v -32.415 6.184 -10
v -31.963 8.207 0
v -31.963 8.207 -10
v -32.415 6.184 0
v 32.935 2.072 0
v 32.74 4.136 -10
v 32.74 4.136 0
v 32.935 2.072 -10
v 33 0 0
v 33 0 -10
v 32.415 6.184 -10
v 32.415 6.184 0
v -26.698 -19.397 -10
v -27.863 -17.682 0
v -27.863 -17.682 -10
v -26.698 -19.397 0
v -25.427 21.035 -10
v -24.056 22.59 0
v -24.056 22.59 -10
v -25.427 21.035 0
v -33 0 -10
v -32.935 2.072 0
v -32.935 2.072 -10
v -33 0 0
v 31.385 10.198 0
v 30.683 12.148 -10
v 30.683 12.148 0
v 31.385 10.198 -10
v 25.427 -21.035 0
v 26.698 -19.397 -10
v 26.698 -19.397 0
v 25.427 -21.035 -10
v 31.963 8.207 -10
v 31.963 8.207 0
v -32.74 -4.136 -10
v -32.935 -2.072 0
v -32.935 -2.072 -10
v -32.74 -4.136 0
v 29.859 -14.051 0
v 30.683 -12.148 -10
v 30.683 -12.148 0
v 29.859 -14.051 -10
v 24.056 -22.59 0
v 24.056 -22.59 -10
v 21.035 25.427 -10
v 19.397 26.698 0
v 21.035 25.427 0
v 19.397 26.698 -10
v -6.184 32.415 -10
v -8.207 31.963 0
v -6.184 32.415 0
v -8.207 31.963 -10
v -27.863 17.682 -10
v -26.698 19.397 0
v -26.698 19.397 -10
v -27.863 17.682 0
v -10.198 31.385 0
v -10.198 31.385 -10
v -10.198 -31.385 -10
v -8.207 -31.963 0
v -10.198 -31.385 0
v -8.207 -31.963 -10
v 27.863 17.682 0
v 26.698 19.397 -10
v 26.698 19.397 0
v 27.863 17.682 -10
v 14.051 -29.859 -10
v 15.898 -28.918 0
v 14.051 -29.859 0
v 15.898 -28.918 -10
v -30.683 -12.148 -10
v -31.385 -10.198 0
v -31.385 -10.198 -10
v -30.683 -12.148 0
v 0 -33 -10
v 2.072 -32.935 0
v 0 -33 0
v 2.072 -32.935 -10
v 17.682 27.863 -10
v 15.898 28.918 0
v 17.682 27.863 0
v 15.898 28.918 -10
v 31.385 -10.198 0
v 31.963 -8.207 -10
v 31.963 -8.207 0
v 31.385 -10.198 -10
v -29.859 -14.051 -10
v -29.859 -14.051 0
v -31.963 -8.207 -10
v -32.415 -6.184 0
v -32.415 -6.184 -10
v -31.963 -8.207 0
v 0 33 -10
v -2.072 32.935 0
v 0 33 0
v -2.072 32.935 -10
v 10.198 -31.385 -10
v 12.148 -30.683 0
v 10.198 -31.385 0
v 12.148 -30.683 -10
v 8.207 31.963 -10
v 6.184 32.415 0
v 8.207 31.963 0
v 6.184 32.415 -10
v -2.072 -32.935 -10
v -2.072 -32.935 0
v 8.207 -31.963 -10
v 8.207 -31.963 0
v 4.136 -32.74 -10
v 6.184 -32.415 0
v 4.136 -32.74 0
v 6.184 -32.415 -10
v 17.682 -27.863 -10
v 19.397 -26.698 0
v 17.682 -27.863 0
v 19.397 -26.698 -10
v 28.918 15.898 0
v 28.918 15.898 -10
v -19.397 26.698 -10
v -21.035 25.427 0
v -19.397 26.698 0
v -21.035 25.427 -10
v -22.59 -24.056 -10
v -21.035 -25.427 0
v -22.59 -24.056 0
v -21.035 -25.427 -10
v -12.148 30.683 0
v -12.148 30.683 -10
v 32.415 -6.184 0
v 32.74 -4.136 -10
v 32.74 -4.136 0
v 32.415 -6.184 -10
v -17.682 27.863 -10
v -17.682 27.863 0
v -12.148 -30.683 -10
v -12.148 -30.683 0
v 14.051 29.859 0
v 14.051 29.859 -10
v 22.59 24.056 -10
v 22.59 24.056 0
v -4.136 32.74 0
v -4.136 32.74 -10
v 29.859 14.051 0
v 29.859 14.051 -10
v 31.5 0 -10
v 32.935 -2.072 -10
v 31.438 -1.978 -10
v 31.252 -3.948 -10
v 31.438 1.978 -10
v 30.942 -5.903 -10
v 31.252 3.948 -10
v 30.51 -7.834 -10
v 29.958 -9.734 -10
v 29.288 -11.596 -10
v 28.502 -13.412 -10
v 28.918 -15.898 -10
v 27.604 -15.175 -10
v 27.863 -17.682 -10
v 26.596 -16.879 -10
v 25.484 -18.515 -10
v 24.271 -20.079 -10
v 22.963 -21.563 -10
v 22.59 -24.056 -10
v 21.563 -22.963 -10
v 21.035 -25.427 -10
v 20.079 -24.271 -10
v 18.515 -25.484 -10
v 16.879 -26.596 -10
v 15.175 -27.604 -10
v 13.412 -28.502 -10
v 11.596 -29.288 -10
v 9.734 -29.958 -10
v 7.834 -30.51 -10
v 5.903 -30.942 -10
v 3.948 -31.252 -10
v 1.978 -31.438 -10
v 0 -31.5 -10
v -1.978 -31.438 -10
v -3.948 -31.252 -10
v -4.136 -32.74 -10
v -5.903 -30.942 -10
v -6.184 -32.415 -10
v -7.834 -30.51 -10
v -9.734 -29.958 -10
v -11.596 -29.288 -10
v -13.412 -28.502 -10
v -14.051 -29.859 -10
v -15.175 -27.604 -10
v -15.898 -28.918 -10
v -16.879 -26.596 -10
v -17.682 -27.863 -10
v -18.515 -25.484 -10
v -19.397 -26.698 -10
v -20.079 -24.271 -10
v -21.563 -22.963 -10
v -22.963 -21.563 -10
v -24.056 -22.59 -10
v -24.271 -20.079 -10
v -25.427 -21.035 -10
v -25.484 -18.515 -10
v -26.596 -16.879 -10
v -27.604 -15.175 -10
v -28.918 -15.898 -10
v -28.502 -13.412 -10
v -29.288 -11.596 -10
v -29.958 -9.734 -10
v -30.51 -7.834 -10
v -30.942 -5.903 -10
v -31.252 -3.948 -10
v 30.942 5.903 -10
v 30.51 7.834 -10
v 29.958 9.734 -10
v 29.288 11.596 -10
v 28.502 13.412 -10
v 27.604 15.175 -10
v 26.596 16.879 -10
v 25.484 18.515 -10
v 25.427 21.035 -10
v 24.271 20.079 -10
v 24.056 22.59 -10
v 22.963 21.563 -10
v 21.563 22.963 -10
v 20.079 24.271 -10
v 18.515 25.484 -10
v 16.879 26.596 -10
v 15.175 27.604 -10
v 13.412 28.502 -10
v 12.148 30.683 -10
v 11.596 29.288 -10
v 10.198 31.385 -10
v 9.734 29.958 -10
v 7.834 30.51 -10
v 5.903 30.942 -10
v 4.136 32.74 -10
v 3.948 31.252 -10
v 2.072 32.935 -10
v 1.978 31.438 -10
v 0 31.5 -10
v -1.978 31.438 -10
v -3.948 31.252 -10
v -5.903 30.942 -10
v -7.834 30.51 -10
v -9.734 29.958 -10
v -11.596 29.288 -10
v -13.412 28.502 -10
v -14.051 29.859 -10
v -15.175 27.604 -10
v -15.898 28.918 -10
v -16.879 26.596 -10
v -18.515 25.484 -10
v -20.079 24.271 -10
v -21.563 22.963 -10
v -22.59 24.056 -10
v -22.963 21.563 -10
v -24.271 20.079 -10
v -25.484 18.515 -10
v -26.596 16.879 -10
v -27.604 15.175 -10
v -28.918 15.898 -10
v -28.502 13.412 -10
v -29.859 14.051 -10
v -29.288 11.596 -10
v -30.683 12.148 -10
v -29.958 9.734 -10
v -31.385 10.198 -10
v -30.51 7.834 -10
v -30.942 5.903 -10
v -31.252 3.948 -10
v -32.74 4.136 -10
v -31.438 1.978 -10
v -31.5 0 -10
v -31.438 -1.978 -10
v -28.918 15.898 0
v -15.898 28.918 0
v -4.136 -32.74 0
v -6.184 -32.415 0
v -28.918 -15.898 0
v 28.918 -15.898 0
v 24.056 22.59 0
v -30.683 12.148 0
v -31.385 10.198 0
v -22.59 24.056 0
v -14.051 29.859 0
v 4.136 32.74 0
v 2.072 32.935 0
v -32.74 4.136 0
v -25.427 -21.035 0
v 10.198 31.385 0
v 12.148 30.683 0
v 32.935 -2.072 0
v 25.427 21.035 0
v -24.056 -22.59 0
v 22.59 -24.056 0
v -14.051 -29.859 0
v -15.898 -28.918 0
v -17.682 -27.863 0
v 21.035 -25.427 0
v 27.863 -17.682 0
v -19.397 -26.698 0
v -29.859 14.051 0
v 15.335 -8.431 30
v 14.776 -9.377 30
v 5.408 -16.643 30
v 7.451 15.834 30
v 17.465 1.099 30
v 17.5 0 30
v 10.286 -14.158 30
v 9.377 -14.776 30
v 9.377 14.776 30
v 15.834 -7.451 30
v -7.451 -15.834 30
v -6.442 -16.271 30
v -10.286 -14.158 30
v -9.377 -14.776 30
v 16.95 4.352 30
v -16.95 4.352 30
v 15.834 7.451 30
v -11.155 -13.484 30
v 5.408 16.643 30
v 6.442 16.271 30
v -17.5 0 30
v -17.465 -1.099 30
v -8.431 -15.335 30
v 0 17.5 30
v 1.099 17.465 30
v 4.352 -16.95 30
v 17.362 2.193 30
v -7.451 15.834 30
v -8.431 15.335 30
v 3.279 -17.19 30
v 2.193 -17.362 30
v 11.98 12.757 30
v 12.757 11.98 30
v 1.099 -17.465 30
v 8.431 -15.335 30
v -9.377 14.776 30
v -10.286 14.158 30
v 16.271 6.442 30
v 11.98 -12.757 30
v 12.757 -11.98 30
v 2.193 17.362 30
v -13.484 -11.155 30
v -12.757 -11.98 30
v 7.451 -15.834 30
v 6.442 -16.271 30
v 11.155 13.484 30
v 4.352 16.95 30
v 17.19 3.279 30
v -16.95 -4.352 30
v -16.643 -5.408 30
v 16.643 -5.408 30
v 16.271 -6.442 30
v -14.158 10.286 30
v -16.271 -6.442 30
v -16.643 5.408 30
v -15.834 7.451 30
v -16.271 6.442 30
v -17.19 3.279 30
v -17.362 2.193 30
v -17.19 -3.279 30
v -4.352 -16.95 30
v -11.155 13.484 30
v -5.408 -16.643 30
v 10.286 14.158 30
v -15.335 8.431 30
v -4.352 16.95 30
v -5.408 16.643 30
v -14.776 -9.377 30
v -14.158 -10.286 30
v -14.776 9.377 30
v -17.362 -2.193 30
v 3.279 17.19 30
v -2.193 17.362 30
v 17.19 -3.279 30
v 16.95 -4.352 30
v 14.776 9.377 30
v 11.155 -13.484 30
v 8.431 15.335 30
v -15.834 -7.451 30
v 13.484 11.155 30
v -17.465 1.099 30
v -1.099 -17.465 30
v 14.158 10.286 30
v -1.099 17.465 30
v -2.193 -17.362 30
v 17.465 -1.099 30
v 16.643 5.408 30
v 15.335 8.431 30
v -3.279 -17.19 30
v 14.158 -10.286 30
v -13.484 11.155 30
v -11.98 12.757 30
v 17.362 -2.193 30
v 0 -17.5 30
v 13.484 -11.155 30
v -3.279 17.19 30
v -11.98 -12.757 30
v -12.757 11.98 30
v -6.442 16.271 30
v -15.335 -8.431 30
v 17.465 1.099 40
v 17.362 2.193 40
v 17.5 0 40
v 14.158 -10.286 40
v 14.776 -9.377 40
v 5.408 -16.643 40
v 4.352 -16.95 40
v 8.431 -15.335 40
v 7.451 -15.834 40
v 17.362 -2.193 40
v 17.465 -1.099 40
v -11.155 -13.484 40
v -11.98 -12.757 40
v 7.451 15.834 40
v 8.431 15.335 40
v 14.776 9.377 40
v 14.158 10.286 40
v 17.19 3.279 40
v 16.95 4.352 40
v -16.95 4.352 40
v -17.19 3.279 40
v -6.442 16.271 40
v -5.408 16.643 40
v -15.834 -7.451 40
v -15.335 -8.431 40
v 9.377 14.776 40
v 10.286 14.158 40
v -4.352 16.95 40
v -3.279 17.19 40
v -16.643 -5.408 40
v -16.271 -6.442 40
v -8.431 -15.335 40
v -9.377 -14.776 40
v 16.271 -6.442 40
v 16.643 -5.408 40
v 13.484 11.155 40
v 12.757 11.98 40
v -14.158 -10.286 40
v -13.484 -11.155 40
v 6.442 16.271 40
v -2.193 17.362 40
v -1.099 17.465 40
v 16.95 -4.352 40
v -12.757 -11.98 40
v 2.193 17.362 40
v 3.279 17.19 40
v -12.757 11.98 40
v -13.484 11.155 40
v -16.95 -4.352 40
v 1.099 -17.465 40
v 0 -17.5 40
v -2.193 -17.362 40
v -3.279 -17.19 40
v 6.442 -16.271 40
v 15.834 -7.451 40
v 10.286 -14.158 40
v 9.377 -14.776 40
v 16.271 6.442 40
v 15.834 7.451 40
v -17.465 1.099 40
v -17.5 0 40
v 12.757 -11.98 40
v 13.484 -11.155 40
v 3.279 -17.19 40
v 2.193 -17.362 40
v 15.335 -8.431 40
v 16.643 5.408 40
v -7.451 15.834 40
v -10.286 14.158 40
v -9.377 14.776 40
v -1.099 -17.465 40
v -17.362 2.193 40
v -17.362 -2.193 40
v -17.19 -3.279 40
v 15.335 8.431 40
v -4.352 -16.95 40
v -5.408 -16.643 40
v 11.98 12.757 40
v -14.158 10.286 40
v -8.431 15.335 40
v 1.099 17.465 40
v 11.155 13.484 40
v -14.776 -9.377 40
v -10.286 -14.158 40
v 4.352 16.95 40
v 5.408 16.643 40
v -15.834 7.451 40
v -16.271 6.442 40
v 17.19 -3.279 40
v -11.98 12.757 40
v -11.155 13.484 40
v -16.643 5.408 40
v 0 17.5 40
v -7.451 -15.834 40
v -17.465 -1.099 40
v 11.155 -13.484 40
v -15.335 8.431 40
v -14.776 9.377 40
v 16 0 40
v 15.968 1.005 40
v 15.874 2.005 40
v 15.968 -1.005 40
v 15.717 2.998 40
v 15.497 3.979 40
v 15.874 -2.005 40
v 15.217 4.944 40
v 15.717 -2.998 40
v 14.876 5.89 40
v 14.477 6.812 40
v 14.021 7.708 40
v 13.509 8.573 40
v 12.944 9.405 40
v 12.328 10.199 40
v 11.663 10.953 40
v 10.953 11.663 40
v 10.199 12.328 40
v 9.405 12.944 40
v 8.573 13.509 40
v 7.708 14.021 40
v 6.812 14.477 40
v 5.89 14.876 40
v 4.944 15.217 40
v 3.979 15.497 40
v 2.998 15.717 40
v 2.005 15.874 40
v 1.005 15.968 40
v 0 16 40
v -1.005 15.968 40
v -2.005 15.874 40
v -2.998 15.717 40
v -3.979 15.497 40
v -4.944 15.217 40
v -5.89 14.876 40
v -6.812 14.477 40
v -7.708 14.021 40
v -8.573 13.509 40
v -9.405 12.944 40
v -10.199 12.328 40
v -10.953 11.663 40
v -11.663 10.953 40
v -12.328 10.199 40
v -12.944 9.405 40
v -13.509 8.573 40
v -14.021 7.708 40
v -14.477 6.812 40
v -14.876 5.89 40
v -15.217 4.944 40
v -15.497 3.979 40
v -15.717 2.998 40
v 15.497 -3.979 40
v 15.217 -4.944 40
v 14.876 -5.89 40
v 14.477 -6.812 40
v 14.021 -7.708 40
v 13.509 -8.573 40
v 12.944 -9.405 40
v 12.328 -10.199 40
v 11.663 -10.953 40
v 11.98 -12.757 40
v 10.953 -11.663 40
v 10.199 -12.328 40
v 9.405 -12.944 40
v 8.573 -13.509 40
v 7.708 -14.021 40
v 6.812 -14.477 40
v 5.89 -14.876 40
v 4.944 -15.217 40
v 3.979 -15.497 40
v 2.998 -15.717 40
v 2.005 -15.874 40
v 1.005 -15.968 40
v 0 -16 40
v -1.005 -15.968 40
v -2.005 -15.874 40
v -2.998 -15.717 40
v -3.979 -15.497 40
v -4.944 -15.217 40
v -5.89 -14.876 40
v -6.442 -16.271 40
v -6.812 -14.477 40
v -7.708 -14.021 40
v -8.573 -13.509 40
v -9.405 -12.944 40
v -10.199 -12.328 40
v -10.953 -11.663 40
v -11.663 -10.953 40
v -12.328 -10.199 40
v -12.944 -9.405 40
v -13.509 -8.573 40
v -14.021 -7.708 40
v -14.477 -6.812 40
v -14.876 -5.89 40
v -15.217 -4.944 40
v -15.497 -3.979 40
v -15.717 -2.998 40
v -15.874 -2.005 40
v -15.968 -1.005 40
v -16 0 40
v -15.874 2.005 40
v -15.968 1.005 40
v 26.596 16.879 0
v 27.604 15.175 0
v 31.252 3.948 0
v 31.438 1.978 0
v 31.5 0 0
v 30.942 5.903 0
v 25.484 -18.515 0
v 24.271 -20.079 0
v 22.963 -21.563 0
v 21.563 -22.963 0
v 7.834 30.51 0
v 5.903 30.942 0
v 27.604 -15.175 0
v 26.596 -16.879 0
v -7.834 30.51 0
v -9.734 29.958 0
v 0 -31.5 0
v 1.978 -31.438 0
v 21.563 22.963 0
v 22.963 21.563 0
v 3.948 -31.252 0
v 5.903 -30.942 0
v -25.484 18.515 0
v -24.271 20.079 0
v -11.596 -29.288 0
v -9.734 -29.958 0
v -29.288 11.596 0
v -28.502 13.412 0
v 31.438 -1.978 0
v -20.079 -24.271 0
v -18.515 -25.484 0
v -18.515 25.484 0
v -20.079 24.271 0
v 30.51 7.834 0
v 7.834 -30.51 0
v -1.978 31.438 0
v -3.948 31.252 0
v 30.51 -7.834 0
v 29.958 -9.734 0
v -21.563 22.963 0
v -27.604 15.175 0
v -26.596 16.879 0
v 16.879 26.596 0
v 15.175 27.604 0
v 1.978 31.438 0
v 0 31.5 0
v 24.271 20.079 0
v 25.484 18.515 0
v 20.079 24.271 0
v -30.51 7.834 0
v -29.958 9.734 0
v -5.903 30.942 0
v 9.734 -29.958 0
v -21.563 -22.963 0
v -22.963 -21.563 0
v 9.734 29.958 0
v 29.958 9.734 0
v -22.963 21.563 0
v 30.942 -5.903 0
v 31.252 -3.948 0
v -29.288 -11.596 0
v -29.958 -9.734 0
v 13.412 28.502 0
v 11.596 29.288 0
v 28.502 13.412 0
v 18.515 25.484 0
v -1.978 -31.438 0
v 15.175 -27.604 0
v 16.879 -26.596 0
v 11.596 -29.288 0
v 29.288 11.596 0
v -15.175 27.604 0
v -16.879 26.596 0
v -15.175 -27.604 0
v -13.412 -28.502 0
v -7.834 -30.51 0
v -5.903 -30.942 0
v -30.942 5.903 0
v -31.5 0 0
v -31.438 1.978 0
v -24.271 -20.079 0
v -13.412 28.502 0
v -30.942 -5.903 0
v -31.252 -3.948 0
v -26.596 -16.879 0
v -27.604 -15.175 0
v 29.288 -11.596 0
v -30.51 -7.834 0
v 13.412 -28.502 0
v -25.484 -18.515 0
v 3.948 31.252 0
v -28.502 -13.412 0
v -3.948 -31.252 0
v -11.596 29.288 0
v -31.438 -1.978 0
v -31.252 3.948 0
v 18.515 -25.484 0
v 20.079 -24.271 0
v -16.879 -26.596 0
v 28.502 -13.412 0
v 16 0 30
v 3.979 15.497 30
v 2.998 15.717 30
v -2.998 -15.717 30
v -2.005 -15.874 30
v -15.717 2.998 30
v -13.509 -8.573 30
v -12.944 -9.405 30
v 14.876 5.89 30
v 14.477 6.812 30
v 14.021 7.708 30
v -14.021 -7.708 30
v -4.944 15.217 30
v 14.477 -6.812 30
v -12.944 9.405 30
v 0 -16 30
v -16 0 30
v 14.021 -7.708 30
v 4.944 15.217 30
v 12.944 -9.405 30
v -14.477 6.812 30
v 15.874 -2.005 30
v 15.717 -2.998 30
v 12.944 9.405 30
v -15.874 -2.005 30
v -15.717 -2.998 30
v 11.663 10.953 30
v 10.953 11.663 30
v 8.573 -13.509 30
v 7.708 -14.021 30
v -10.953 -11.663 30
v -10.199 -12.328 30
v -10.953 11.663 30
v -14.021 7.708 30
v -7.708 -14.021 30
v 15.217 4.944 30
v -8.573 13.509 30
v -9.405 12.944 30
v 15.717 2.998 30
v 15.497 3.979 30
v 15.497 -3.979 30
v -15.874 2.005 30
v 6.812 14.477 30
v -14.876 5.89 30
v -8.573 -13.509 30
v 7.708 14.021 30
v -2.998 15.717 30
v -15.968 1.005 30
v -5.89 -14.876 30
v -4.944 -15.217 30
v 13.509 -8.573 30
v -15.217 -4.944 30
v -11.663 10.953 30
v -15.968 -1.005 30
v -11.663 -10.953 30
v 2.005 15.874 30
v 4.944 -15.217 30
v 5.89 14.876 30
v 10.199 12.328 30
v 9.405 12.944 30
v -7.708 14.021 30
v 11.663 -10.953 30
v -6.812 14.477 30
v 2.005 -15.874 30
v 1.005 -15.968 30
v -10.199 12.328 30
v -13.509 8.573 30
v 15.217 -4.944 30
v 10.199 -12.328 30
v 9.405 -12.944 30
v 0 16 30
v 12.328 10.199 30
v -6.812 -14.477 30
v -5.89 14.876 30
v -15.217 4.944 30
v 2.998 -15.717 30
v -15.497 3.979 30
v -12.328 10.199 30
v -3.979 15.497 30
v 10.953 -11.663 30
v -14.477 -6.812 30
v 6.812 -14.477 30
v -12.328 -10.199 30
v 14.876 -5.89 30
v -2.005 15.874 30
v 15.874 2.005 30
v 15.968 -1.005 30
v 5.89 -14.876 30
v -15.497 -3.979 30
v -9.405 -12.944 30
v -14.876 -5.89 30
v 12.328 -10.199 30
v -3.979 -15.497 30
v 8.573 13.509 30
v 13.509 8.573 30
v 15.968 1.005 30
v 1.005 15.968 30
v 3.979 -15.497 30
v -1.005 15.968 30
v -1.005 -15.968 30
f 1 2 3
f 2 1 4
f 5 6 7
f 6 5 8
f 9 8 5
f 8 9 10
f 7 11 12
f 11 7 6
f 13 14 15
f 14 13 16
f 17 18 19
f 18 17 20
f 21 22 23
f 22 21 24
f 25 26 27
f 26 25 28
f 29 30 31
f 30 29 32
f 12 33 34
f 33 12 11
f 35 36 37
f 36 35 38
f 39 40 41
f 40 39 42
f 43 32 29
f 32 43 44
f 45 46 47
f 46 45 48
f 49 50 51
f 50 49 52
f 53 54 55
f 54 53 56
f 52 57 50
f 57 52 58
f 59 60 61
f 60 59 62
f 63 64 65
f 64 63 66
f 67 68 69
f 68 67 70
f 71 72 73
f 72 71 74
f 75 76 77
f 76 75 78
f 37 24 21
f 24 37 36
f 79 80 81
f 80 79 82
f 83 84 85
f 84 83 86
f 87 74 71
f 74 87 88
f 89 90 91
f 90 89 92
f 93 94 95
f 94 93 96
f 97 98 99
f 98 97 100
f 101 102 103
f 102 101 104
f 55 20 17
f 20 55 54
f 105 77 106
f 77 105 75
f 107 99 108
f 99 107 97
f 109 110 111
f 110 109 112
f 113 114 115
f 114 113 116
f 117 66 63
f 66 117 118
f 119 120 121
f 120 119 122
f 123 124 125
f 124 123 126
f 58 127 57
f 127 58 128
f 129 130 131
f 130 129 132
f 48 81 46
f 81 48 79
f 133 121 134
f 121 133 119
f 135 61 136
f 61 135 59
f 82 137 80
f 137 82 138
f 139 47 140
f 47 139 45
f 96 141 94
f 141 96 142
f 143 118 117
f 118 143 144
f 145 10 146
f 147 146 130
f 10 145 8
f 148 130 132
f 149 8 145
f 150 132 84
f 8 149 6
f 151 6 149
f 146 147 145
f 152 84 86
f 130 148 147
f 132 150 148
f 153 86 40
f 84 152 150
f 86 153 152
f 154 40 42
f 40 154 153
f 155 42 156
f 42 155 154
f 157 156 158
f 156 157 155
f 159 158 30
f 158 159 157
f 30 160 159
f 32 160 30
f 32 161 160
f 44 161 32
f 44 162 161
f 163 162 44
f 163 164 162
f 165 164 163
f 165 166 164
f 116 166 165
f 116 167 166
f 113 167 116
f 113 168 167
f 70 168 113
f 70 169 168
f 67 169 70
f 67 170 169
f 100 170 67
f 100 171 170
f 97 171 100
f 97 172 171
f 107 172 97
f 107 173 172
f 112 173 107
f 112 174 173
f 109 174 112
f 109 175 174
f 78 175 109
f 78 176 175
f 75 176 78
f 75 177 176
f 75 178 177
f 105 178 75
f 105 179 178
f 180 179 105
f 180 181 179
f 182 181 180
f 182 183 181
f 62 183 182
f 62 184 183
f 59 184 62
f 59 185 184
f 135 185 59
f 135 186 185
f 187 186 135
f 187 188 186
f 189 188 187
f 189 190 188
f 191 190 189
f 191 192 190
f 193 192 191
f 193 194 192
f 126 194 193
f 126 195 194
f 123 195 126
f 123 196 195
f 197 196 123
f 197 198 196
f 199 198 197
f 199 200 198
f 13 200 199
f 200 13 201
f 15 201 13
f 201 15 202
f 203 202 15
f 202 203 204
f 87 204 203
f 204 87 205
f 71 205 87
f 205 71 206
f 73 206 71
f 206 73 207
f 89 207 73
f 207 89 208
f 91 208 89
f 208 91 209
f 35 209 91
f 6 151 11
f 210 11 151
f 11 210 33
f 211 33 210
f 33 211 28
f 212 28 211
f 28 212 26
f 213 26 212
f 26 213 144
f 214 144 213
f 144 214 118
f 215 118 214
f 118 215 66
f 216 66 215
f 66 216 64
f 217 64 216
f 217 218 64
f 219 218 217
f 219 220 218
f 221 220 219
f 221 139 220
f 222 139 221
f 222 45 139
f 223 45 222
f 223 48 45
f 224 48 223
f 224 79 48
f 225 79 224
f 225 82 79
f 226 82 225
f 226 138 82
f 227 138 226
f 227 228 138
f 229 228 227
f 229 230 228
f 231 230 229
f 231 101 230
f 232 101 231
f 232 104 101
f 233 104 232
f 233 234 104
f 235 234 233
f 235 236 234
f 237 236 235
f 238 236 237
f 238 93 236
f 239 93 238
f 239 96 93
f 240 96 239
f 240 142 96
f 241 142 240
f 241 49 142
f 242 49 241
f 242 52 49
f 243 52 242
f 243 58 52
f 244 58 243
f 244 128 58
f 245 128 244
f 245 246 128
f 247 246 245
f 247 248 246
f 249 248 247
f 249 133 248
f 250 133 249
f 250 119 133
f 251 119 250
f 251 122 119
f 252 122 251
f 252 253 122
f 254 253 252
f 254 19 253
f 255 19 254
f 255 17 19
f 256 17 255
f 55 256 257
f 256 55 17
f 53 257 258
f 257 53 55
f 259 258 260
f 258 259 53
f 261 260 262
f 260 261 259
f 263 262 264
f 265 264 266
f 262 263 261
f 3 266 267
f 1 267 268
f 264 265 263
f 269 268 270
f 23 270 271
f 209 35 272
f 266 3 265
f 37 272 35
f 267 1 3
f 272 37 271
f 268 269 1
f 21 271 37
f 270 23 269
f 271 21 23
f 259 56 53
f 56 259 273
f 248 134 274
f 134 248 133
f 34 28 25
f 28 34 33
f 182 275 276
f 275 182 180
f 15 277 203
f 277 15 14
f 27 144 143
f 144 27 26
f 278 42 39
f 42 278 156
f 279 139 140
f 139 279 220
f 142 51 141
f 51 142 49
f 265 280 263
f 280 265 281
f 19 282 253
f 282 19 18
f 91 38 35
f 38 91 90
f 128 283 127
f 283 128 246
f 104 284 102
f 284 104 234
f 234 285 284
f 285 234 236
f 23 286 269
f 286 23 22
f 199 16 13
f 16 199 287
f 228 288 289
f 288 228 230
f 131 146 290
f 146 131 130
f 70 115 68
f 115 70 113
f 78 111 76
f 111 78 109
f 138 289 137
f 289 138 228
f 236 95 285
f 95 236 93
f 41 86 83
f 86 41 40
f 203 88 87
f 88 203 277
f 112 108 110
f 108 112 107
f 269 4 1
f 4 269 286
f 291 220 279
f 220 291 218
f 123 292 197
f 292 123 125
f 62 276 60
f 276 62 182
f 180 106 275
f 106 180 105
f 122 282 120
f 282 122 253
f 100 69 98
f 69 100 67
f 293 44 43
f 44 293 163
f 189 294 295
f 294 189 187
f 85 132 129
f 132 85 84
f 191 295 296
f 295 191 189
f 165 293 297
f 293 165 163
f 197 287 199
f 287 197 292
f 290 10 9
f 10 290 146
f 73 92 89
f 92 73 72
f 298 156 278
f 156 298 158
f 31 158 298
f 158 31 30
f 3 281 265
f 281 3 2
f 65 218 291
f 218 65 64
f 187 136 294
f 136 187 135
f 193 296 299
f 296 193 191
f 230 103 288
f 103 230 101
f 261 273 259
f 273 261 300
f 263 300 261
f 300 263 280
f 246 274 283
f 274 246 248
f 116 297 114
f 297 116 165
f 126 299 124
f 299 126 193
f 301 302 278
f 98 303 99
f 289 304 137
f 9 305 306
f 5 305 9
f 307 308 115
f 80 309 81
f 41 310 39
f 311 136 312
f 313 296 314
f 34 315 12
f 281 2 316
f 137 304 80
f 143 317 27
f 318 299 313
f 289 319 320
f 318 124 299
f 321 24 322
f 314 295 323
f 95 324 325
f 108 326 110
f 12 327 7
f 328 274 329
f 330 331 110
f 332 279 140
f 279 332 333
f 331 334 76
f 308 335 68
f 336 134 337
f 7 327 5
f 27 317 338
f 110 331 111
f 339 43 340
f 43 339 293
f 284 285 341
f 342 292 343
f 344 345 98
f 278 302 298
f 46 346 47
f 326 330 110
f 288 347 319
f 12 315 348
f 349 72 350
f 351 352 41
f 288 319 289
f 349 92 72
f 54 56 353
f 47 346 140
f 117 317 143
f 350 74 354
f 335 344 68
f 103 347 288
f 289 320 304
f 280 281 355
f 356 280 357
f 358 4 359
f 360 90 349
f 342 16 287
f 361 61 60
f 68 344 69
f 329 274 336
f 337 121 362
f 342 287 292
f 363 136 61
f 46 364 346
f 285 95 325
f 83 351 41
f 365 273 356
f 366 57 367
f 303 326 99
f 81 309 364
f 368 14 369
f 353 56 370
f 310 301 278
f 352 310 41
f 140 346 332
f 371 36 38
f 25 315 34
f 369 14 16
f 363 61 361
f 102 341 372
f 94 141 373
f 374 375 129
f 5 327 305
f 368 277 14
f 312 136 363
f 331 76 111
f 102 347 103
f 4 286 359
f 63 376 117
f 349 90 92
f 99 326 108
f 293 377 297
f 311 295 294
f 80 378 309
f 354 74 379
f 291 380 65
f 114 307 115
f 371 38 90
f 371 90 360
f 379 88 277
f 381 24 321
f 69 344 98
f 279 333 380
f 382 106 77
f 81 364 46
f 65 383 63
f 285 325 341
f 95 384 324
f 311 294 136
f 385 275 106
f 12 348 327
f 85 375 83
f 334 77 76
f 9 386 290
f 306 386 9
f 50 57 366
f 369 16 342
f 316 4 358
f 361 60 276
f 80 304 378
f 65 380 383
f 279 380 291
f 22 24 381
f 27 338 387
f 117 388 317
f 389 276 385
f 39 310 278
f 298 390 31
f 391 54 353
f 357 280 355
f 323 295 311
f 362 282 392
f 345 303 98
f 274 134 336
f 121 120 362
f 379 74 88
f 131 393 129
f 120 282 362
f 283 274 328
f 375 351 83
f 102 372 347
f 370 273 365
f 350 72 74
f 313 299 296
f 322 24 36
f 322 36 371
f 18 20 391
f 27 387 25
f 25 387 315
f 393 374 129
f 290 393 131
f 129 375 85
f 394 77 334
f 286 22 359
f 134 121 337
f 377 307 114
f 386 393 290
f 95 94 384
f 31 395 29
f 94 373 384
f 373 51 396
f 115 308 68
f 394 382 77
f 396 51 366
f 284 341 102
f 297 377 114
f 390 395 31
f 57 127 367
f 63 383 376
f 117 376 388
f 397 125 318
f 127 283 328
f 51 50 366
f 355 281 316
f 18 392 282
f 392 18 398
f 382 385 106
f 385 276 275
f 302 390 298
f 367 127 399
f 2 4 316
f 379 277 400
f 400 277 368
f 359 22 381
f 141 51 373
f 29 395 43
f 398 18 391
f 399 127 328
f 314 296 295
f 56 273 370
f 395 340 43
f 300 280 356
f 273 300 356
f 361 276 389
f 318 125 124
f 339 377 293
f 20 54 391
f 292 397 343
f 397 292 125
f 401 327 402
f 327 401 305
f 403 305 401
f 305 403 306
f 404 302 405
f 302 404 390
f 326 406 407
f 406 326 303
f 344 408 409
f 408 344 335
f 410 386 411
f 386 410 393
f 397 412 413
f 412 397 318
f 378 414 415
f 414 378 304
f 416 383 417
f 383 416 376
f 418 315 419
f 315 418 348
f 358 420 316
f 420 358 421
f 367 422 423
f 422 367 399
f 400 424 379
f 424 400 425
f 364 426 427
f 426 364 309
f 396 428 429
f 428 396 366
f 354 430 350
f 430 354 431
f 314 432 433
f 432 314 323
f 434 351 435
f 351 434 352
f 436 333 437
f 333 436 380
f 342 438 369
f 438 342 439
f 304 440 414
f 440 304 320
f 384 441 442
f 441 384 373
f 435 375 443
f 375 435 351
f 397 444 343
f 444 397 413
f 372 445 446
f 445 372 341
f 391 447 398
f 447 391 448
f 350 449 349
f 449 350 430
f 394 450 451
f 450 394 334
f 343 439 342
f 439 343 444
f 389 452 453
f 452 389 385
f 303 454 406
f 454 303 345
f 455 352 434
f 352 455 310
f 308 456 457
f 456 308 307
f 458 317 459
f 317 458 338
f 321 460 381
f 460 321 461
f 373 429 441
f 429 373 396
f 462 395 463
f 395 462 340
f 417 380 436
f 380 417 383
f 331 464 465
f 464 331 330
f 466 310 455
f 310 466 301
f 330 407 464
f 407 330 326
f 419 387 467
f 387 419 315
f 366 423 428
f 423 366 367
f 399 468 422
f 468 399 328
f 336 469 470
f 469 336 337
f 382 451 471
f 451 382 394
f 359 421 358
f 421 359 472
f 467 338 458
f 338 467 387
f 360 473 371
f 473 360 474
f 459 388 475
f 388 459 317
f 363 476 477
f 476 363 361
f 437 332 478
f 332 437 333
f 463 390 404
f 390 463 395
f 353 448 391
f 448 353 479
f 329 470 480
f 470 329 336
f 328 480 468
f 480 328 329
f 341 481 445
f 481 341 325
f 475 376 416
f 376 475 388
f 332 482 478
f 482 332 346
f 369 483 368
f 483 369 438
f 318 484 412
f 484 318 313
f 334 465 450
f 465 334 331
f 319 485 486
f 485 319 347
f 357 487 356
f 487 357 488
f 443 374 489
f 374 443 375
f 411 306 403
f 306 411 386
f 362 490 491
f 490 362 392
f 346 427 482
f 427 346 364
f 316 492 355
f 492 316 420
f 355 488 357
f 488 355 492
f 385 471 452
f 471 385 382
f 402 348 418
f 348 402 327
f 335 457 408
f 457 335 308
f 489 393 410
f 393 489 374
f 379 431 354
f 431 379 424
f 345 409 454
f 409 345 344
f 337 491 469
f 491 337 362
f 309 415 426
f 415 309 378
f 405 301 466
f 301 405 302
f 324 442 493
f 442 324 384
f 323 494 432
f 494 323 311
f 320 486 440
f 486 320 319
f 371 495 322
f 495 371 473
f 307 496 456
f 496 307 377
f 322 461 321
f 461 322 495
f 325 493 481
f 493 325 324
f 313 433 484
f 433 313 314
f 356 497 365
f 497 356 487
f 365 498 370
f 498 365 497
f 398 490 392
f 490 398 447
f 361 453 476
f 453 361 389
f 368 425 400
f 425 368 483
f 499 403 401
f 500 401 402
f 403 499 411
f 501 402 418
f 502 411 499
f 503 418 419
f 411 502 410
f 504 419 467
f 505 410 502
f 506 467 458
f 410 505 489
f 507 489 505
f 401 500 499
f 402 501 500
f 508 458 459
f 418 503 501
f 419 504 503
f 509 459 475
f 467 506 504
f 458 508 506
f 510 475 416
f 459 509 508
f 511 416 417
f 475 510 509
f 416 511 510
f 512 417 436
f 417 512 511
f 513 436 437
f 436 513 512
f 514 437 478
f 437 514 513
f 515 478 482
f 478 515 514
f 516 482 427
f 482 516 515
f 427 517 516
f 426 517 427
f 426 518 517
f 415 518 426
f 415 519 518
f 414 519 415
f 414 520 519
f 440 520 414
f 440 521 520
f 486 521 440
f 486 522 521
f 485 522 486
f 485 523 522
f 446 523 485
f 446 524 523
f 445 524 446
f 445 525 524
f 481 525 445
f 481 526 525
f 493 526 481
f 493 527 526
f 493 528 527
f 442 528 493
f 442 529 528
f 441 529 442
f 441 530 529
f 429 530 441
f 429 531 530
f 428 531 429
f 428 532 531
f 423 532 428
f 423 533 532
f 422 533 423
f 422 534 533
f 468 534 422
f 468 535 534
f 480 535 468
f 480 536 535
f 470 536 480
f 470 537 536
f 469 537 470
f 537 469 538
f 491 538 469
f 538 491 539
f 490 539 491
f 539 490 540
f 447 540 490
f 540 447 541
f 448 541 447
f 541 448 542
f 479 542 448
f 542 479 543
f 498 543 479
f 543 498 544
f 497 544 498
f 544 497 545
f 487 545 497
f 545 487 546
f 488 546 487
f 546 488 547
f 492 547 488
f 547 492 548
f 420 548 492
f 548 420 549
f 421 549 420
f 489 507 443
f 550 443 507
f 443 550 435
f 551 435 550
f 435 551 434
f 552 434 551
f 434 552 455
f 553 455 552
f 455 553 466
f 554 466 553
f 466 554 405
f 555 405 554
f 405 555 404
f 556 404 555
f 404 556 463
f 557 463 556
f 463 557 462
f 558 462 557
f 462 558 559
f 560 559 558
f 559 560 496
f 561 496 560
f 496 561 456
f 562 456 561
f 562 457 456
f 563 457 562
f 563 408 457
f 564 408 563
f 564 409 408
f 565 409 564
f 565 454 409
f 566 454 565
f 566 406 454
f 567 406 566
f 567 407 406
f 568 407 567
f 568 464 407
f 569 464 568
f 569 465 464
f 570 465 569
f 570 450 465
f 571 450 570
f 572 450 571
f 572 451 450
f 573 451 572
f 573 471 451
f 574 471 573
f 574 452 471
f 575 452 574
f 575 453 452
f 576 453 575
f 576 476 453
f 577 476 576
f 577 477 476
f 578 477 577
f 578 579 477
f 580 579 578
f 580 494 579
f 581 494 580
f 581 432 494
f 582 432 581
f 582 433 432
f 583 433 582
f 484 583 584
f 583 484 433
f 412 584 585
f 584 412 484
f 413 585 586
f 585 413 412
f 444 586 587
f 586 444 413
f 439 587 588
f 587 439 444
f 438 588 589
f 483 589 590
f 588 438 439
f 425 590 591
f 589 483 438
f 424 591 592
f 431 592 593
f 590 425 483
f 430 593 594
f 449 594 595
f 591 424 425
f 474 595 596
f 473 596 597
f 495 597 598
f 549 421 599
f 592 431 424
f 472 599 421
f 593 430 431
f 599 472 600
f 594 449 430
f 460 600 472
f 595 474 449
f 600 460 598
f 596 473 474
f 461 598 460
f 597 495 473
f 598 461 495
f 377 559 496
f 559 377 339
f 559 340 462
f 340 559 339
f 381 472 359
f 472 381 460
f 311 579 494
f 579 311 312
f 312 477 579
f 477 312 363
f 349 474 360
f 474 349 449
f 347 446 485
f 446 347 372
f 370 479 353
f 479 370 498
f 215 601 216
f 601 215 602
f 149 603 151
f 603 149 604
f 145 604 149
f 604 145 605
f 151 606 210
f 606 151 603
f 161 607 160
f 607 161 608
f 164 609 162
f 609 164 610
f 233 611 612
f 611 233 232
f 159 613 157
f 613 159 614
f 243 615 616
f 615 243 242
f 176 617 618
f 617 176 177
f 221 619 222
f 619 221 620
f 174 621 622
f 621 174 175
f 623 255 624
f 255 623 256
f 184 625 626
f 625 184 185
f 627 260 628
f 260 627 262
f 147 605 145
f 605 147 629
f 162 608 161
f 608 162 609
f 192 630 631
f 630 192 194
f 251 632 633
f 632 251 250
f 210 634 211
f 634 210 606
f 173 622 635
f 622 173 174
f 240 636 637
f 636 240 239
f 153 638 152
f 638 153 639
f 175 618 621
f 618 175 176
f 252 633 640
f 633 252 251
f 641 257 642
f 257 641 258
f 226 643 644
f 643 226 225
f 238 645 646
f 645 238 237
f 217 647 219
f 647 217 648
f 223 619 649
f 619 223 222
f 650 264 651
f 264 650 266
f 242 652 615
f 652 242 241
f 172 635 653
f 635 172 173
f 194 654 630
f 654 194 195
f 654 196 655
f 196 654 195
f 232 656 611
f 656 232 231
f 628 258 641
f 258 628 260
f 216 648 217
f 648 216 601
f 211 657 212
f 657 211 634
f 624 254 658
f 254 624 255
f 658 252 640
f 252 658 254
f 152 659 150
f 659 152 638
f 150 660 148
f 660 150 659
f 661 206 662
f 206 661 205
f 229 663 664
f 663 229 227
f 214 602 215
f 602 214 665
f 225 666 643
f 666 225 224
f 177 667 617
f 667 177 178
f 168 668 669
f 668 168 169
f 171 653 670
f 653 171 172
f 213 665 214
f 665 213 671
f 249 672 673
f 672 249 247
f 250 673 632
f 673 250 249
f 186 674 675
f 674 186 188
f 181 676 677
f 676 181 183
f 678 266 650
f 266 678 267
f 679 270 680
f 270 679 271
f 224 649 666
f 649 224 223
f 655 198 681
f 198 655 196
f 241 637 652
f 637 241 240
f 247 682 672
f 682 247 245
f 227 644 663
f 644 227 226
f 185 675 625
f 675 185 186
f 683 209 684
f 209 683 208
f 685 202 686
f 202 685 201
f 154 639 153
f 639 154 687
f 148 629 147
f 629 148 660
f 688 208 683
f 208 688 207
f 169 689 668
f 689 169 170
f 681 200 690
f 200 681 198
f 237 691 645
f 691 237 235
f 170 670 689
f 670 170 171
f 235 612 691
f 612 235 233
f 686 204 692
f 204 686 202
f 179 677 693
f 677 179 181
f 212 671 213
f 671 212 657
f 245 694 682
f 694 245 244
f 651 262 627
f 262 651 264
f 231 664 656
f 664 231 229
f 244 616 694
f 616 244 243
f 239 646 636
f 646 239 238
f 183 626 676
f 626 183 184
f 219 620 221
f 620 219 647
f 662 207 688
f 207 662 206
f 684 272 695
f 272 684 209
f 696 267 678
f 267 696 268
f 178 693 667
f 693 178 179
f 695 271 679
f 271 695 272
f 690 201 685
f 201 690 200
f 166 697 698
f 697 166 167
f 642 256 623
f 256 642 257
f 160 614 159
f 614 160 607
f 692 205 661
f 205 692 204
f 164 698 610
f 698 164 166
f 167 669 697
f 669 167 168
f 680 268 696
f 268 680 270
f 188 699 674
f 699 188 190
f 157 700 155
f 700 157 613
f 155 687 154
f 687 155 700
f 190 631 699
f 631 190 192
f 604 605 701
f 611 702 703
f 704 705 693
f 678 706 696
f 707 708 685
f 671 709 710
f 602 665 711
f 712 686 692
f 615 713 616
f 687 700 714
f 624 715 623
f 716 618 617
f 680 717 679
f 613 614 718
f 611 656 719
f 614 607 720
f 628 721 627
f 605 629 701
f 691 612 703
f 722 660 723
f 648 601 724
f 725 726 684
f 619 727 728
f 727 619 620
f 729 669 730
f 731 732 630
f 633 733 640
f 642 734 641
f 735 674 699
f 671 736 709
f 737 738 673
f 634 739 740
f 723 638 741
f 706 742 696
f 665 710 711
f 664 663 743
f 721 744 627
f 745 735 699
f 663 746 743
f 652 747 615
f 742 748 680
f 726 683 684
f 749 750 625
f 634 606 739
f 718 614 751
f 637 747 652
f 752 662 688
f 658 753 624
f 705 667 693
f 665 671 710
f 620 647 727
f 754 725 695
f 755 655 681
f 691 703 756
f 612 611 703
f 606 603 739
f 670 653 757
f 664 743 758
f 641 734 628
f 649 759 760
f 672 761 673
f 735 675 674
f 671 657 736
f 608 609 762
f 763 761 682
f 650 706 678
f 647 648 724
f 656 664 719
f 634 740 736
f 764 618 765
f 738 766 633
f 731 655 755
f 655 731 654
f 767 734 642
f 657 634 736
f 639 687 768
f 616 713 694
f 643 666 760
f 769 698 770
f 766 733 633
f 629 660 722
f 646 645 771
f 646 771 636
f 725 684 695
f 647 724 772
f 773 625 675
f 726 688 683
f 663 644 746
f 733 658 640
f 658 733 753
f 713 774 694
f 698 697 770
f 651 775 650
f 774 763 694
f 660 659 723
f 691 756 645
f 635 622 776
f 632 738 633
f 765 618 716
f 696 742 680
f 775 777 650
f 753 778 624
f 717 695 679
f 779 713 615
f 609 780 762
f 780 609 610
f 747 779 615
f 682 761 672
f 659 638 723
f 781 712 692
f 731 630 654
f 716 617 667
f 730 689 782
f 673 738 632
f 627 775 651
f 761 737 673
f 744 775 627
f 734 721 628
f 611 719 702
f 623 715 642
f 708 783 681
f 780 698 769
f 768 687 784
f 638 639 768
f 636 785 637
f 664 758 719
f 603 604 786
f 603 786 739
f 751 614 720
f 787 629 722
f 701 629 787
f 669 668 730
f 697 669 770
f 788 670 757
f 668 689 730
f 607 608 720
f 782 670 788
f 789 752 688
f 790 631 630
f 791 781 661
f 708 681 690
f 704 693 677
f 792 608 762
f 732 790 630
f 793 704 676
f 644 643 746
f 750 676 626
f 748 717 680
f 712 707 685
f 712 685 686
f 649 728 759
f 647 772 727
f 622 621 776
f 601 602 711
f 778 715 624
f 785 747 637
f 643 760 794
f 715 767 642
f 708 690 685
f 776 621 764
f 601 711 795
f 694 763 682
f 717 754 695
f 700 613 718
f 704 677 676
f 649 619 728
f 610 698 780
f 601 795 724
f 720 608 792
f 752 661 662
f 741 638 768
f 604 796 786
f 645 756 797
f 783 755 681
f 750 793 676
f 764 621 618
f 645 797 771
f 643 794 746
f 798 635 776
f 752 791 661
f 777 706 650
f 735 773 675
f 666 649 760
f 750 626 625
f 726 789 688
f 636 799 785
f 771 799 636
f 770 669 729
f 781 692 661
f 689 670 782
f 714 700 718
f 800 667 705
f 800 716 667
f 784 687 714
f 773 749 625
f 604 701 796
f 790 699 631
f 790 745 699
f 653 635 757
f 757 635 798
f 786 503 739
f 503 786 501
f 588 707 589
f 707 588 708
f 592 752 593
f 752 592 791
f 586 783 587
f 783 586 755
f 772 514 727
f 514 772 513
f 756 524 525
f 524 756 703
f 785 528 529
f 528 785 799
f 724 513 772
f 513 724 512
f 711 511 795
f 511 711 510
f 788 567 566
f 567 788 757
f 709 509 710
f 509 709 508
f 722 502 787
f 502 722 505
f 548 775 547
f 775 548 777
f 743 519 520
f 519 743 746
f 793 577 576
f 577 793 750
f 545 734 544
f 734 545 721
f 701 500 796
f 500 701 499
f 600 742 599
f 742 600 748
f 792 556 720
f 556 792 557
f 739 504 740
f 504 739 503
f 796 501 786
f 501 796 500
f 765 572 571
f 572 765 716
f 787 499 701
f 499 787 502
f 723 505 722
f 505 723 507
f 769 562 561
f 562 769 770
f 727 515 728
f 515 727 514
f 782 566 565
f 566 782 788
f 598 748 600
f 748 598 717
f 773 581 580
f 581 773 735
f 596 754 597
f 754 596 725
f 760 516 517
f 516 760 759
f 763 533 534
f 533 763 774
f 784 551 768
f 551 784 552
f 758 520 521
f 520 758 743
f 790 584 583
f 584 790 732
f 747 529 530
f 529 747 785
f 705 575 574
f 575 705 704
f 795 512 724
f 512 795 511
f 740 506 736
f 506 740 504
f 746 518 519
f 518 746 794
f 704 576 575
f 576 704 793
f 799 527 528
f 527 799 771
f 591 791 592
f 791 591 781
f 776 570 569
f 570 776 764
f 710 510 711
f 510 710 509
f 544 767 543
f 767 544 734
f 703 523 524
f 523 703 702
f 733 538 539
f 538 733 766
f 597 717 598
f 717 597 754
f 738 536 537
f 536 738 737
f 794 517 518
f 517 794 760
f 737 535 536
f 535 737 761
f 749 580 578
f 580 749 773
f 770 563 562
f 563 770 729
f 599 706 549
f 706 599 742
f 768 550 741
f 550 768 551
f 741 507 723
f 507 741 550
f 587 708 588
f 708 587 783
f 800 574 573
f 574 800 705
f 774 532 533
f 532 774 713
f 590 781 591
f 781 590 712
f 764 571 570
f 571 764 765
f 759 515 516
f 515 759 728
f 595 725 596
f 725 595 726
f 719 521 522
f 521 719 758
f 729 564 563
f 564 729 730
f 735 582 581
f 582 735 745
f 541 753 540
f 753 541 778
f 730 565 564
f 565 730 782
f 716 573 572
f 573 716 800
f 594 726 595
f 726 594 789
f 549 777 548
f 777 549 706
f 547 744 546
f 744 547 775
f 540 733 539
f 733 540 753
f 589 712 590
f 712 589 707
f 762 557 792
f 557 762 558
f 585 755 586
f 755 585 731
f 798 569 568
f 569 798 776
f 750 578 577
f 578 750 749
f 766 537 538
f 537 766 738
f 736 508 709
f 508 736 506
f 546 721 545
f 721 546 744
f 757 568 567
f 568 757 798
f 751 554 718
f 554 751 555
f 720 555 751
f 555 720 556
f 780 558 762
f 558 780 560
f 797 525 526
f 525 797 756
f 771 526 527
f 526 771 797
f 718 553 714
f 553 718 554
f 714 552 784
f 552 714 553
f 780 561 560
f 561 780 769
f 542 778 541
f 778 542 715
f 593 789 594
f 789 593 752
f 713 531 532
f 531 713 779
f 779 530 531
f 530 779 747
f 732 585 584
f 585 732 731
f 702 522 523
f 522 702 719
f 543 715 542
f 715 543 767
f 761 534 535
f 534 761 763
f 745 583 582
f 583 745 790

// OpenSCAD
SmallDiameter=32;
LargeDiameter=63;
WallThick=3;
SleeveLength=10;
ConeLength=30;

$fn = 100;

difference(){
    union(){
        translate([0,0,-SleeveLength]) cylinder(d=LargeDiameter+WallThick,h=SleeveLength);
        cylinder(d1=LargeDiameter+WallThick,d2=SmallDiameter+WallThick,h=ConeLength);
        translate([0,0,ConeLength]) cylinder(d=SmallDiameter+WallThick,h=SleeveLength);
    }
    union(){
        translate([0,0,-SleeveLength]) cylinder(d=LargeDiameter,h=SleeveLength);
        cylinder(d1=LargeDiameter,d2=SmallDiameter,h=ConeLength);
        translate([0,0,ConeLength]) cylinder(d=SmallDiameter,h=SleeveLength);
    }
}
